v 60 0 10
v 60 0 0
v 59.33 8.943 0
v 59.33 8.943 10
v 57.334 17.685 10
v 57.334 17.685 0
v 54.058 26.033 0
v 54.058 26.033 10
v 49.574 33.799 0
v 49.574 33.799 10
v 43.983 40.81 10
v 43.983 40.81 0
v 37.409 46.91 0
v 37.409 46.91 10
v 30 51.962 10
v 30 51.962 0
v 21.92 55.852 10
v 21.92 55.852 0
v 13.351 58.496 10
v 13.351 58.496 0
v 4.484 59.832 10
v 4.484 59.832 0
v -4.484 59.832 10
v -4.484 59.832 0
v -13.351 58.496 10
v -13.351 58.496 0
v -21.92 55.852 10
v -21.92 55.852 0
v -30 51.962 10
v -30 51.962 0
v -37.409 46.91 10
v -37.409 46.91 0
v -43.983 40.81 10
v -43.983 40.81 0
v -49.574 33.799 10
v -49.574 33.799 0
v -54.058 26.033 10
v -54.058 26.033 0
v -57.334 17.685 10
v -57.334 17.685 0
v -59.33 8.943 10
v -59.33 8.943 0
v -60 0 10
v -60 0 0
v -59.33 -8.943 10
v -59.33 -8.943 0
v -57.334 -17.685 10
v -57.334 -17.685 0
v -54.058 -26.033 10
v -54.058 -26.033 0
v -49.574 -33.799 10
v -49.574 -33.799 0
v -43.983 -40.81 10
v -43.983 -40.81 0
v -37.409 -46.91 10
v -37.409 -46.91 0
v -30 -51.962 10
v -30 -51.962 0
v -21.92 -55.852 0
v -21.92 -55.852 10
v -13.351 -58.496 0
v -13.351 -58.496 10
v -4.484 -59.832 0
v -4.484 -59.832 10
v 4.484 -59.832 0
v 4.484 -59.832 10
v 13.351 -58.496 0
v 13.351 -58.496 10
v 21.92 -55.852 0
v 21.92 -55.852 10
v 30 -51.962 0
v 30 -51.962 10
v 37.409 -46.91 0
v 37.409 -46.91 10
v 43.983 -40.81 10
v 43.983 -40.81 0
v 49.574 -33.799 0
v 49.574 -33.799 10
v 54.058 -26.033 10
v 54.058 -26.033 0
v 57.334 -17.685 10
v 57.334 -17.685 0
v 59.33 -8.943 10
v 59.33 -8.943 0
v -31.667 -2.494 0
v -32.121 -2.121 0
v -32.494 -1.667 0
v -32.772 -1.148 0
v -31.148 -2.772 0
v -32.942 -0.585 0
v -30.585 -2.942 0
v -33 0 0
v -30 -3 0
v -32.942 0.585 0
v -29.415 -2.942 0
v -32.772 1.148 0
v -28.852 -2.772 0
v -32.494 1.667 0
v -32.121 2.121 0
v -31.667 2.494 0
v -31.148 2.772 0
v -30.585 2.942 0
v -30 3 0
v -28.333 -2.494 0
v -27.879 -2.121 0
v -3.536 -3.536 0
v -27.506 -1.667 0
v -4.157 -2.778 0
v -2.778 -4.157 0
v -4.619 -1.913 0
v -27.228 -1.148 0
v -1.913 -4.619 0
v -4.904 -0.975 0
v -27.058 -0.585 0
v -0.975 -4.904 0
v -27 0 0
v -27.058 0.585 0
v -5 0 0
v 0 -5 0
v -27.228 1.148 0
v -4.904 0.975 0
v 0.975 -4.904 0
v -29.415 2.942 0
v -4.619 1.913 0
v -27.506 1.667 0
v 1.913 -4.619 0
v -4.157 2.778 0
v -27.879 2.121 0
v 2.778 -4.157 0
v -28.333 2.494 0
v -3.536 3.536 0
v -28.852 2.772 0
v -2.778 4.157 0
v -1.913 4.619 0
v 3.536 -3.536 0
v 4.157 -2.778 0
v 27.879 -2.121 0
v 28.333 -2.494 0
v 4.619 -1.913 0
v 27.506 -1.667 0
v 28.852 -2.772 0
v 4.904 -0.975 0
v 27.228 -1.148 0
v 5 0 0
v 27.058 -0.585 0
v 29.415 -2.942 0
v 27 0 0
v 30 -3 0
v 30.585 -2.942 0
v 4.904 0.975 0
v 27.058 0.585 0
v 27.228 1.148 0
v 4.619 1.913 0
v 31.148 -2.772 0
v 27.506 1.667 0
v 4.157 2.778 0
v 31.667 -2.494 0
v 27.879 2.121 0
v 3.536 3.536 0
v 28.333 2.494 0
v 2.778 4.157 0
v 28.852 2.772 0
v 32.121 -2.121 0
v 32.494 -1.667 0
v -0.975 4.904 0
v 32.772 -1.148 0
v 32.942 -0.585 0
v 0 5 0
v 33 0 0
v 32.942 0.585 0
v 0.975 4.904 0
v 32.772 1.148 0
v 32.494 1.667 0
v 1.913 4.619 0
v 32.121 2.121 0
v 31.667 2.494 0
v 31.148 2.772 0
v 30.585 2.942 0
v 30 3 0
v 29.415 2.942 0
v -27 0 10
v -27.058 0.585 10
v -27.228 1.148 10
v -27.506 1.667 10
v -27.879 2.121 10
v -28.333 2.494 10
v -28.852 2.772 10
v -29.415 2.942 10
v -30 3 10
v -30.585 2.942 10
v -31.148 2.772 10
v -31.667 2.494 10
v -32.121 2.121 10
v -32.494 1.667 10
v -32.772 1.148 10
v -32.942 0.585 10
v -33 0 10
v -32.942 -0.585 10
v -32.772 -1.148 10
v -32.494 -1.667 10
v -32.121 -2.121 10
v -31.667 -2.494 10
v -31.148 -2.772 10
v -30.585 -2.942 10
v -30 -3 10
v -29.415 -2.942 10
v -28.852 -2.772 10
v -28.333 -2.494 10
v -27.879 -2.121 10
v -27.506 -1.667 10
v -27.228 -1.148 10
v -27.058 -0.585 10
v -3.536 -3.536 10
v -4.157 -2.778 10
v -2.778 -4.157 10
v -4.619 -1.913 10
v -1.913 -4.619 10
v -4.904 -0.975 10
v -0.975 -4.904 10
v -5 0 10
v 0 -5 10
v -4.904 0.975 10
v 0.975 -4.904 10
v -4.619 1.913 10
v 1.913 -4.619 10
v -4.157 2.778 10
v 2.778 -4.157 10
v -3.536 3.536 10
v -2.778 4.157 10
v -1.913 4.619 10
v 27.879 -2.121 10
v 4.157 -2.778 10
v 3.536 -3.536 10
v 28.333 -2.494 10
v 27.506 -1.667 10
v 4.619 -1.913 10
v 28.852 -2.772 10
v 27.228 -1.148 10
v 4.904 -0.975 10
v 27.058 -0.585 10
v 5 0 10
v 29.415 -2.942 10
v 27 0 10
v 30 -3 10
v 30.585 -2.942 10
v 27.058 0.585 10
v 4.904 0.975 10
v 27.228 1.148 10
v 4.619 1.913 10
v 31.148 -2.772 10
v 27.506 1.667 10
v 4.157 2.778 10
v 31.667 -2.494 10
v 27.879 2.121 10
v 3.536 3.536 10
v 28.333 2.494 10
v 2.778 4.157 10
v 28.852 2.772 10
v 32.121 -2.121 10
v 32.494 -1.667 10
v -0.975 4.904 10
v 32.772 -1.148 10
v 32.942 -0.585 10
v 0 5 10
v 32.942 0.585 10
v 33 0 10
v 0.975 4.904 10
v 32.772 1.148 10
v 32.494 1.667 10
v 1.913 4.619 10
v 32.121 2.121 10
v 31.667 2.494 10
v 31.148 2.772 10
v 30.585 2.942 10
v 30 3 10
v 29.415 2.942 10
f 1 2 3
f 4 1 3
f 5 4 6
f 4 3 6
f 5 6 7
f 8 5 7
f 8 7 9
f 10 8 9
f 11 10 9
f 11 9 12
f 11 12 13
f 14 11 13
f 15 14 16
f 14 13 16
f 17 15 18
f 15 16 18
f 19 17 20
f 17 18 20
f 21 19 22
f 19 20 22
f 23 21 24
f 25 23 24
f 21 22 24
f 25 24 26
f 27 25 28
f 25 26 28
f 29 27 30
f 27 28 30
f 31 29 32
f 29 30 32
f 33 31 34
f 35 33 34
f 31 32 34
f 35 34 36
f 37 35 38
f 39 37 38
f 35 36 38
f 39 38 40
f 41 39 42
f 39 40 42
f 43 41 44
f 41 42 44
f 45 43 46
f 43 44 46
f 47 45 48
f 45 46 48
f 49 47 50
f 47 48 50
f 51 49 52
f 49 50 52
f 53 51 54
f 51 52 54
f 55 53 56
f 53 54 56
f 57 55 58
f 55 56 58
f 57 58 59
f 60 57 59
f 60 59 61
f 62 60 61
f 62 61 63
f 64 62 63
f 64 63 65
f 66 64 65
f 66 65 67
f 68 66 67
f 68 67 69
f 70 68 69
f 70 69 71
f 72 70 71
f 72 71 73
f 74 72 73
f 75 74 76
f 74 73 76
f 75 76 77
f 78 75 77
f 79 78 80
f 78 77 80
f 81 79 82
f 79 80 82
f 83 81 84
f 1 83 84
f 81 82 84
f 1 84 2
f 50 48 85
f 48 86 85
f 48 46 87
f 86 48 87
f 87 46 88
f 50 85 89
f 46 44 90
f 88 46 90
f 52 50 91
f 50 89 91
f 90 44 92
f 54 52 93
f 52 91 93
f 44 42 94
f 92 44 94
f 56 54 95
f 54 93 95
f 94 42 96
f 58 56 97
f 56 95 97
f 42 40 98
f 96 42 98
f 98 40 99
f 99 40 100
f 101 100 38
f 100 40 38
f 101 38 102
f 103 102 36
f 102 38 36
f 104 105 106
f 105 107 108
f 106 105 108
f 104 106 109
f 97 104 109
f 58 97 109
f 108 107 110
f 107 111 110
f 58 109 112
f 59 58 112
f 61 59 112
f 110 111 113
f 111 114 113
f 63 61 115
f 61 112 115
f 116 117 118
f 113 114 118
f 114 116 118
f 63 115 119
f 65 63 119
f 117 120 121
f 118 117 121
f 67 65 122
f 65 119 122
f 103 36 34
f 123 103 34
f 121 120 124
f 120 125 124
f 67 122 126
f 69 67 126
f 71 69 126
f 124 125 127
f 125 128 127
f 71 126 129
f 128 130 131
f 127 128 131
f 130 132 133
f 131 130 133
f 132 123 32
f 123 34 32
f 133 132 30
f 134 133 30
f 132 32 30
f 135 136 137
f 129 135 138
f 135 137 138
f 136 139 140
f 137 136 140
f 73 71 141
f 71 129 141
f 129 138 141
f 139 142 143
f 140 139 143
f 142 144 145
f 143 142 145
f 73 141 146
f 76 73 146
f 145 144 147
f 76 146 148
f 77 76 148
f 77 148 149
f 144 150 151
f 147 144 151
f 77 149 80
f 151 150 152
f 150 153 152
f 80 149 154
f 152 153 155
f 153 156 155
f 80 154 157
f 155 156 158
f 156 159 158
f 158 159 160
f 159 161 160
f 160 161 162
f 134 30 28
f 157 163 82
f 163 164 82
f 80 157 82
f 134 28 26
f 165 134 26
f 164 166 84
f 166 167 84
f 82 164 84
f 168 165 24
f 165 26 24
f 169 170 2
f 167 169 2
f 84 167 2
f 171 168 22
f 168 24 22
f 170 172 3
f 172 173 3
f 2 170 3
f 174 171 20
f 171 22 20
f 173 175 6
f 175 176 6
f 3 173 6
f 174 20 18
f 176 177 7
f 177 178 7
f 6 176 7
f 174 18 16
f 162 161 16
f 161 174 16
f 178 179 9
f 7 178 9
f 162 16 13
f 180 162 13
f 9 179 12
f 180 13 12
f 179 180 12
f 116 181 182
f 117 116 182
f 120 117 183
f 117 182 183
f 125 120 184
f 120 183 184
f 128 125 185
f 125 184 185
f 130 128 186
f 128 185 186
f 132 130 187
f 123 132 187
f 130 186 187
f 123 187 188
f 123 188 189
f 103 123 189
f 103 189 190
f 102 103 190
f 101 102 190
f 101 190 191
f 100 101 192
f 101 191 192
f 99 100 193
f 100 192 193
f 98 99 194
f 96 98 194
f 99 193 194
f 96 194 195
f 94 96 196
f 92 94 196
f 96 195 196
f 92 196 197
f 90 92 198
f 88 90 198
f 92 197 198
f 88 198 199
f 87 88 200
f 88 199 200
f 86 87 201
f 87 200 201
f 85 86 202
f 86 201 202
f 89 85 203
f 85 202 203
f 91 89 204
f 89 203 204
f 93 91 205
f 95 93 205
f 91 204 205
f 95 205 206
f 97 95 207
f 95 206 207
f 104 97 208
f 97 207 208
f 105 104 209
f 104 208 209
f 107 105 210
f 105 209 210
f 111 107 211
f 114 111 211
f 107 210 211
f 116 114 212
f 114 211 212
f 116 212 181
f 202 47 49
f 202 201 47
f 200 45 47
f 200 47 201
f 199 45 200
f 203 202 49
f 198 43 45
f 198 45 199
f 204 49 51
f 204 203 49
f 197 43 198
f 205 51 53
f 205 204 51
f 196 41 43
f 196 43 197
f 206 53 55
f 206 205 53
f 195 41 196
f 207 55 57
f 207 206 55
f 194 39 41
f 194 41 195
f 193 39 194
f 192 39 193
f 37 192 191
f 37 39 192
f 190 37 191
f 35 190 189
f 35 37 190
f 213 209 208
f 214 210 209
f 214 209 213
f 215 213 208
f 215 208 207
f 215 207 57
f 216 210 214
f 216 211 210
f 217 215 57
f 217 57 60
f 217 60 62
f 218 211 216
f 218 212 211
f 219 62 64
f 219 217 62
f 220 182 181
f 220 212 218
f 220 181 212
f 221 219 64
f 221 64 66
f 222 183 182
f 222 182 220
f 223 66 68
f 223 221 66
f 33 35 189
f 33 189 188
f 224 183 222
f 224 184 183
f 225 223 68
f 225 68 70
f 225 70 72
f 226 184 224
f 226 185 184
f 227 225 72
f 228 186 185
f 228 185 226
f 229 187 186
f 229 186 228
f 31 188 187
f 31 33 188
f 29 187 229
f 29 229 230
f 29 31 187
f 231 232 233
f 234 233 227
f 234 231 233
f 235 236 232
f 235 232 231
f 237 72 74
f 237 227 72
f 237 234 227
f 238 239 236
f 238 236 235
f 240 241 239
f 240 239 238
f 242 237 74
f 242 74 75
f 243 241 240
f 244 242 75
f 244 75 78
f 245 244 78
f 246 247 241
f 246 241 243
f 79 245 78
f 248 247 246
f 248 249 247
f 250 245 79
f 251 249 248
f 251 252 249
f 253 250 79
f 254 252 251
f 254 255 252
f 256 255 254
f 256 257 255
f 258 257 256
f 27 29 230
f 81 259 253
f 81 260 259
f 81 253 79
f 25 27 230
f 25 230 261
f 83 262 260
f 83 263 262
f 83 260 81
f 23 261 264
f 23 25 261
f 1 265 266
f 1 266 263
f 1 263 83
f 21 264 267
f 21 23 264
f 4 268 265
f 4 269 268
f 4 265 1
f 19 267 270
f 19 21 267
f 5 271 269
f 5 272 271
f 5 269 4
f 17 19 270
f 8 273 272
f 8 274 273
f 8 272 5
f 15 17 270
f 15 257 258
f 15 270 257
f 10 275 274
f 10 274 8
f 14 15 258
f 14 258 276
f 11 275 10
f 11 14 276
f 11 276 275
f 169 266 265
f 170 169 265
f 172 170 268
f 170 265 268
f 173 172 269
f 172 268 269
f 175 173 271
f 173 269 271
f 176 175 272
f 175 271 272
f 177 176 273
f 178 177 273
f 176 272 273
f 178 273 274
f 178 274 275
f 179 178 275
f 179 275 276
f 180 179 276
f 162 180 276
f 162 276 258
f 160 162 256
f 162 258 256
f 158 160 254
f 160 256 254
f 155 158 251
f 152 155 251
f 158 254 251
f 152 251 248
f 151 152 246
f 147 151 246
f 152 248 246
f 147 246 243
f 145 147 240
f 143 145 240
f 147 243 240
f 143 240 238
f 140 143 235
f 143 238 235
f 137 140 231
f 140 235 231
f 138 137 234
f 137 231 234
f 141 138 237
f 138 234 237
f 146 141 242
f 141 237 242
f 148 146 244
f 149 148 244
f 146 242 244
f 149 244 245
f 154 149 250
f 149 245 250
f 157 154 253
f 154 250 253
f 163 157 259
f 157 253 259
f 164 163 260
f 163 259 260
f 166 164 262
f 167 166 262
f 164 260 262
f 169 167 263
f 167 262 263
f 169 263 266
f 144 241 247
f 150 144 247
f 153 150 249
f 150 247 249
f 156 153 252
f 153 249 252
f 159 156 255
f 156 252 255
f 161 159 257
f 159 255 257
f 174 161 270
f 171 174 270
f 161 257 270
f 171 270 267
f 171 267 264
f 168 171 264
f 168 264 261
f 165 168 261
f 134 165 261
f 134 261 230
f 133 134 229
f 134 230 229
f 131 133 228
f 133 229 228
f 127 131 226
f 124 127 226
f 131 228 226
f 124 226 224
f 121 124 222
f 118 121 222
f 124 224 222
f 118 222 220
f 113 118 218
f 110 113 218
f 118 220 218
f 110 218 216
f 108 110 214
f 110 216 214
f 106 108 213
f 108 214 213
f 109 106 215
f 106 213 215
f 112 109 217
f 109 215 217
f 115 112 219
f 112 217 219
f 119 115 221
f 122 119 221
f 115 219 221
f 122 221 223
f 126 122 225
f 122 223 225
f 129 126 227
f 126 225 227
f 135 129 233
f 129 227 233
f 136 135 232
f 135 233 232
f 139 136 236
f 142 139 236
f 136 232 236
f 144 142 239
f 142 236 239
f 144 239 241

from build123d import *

# Parameters (mm, degrees)
SKETCH1_R           = 60
BOSS_EXTRUDE1_DEPTH = 10
SKETCH2_R           = 5
CUT_EXTRUDE1_DEPTH  = 10
SKETCH3_R           = 3
CUT_EXTRUDE2_DEPTH  = 10


with BuildPart() as part:
    # Sketch1 → Boss-Extrude1 (new body)
    with BuildSketch(Plane.XY):
        Circle(SKETCH1_R)
    extrude(amount=BOSS_EXTRUDE1_DEPTH)

    # Sketch2 → Cut-Extrude1 (cut)
    with BuildSketch(Plane.XY.offset(10)):
        Circle(SKETCH2_R)
    extrude(amount=-CUT_EXTRUDE1_DEPTH, mode=Mode.SUBTRACT)

    # Sketch3 → Cut-Extrude2 (cut)
    with BuildSketch(Plane.XY.offset(10)):
        with Locations((-30, 0)):
            Circle(SKETCH3_R)
        with Locations((30, 0)):
            Circle(SKETCH3_R)
    extrude(amount=-CUT_EXTRUDE2_DEPTH, mode=Mode.SUBTRACT)


solid = part.part
